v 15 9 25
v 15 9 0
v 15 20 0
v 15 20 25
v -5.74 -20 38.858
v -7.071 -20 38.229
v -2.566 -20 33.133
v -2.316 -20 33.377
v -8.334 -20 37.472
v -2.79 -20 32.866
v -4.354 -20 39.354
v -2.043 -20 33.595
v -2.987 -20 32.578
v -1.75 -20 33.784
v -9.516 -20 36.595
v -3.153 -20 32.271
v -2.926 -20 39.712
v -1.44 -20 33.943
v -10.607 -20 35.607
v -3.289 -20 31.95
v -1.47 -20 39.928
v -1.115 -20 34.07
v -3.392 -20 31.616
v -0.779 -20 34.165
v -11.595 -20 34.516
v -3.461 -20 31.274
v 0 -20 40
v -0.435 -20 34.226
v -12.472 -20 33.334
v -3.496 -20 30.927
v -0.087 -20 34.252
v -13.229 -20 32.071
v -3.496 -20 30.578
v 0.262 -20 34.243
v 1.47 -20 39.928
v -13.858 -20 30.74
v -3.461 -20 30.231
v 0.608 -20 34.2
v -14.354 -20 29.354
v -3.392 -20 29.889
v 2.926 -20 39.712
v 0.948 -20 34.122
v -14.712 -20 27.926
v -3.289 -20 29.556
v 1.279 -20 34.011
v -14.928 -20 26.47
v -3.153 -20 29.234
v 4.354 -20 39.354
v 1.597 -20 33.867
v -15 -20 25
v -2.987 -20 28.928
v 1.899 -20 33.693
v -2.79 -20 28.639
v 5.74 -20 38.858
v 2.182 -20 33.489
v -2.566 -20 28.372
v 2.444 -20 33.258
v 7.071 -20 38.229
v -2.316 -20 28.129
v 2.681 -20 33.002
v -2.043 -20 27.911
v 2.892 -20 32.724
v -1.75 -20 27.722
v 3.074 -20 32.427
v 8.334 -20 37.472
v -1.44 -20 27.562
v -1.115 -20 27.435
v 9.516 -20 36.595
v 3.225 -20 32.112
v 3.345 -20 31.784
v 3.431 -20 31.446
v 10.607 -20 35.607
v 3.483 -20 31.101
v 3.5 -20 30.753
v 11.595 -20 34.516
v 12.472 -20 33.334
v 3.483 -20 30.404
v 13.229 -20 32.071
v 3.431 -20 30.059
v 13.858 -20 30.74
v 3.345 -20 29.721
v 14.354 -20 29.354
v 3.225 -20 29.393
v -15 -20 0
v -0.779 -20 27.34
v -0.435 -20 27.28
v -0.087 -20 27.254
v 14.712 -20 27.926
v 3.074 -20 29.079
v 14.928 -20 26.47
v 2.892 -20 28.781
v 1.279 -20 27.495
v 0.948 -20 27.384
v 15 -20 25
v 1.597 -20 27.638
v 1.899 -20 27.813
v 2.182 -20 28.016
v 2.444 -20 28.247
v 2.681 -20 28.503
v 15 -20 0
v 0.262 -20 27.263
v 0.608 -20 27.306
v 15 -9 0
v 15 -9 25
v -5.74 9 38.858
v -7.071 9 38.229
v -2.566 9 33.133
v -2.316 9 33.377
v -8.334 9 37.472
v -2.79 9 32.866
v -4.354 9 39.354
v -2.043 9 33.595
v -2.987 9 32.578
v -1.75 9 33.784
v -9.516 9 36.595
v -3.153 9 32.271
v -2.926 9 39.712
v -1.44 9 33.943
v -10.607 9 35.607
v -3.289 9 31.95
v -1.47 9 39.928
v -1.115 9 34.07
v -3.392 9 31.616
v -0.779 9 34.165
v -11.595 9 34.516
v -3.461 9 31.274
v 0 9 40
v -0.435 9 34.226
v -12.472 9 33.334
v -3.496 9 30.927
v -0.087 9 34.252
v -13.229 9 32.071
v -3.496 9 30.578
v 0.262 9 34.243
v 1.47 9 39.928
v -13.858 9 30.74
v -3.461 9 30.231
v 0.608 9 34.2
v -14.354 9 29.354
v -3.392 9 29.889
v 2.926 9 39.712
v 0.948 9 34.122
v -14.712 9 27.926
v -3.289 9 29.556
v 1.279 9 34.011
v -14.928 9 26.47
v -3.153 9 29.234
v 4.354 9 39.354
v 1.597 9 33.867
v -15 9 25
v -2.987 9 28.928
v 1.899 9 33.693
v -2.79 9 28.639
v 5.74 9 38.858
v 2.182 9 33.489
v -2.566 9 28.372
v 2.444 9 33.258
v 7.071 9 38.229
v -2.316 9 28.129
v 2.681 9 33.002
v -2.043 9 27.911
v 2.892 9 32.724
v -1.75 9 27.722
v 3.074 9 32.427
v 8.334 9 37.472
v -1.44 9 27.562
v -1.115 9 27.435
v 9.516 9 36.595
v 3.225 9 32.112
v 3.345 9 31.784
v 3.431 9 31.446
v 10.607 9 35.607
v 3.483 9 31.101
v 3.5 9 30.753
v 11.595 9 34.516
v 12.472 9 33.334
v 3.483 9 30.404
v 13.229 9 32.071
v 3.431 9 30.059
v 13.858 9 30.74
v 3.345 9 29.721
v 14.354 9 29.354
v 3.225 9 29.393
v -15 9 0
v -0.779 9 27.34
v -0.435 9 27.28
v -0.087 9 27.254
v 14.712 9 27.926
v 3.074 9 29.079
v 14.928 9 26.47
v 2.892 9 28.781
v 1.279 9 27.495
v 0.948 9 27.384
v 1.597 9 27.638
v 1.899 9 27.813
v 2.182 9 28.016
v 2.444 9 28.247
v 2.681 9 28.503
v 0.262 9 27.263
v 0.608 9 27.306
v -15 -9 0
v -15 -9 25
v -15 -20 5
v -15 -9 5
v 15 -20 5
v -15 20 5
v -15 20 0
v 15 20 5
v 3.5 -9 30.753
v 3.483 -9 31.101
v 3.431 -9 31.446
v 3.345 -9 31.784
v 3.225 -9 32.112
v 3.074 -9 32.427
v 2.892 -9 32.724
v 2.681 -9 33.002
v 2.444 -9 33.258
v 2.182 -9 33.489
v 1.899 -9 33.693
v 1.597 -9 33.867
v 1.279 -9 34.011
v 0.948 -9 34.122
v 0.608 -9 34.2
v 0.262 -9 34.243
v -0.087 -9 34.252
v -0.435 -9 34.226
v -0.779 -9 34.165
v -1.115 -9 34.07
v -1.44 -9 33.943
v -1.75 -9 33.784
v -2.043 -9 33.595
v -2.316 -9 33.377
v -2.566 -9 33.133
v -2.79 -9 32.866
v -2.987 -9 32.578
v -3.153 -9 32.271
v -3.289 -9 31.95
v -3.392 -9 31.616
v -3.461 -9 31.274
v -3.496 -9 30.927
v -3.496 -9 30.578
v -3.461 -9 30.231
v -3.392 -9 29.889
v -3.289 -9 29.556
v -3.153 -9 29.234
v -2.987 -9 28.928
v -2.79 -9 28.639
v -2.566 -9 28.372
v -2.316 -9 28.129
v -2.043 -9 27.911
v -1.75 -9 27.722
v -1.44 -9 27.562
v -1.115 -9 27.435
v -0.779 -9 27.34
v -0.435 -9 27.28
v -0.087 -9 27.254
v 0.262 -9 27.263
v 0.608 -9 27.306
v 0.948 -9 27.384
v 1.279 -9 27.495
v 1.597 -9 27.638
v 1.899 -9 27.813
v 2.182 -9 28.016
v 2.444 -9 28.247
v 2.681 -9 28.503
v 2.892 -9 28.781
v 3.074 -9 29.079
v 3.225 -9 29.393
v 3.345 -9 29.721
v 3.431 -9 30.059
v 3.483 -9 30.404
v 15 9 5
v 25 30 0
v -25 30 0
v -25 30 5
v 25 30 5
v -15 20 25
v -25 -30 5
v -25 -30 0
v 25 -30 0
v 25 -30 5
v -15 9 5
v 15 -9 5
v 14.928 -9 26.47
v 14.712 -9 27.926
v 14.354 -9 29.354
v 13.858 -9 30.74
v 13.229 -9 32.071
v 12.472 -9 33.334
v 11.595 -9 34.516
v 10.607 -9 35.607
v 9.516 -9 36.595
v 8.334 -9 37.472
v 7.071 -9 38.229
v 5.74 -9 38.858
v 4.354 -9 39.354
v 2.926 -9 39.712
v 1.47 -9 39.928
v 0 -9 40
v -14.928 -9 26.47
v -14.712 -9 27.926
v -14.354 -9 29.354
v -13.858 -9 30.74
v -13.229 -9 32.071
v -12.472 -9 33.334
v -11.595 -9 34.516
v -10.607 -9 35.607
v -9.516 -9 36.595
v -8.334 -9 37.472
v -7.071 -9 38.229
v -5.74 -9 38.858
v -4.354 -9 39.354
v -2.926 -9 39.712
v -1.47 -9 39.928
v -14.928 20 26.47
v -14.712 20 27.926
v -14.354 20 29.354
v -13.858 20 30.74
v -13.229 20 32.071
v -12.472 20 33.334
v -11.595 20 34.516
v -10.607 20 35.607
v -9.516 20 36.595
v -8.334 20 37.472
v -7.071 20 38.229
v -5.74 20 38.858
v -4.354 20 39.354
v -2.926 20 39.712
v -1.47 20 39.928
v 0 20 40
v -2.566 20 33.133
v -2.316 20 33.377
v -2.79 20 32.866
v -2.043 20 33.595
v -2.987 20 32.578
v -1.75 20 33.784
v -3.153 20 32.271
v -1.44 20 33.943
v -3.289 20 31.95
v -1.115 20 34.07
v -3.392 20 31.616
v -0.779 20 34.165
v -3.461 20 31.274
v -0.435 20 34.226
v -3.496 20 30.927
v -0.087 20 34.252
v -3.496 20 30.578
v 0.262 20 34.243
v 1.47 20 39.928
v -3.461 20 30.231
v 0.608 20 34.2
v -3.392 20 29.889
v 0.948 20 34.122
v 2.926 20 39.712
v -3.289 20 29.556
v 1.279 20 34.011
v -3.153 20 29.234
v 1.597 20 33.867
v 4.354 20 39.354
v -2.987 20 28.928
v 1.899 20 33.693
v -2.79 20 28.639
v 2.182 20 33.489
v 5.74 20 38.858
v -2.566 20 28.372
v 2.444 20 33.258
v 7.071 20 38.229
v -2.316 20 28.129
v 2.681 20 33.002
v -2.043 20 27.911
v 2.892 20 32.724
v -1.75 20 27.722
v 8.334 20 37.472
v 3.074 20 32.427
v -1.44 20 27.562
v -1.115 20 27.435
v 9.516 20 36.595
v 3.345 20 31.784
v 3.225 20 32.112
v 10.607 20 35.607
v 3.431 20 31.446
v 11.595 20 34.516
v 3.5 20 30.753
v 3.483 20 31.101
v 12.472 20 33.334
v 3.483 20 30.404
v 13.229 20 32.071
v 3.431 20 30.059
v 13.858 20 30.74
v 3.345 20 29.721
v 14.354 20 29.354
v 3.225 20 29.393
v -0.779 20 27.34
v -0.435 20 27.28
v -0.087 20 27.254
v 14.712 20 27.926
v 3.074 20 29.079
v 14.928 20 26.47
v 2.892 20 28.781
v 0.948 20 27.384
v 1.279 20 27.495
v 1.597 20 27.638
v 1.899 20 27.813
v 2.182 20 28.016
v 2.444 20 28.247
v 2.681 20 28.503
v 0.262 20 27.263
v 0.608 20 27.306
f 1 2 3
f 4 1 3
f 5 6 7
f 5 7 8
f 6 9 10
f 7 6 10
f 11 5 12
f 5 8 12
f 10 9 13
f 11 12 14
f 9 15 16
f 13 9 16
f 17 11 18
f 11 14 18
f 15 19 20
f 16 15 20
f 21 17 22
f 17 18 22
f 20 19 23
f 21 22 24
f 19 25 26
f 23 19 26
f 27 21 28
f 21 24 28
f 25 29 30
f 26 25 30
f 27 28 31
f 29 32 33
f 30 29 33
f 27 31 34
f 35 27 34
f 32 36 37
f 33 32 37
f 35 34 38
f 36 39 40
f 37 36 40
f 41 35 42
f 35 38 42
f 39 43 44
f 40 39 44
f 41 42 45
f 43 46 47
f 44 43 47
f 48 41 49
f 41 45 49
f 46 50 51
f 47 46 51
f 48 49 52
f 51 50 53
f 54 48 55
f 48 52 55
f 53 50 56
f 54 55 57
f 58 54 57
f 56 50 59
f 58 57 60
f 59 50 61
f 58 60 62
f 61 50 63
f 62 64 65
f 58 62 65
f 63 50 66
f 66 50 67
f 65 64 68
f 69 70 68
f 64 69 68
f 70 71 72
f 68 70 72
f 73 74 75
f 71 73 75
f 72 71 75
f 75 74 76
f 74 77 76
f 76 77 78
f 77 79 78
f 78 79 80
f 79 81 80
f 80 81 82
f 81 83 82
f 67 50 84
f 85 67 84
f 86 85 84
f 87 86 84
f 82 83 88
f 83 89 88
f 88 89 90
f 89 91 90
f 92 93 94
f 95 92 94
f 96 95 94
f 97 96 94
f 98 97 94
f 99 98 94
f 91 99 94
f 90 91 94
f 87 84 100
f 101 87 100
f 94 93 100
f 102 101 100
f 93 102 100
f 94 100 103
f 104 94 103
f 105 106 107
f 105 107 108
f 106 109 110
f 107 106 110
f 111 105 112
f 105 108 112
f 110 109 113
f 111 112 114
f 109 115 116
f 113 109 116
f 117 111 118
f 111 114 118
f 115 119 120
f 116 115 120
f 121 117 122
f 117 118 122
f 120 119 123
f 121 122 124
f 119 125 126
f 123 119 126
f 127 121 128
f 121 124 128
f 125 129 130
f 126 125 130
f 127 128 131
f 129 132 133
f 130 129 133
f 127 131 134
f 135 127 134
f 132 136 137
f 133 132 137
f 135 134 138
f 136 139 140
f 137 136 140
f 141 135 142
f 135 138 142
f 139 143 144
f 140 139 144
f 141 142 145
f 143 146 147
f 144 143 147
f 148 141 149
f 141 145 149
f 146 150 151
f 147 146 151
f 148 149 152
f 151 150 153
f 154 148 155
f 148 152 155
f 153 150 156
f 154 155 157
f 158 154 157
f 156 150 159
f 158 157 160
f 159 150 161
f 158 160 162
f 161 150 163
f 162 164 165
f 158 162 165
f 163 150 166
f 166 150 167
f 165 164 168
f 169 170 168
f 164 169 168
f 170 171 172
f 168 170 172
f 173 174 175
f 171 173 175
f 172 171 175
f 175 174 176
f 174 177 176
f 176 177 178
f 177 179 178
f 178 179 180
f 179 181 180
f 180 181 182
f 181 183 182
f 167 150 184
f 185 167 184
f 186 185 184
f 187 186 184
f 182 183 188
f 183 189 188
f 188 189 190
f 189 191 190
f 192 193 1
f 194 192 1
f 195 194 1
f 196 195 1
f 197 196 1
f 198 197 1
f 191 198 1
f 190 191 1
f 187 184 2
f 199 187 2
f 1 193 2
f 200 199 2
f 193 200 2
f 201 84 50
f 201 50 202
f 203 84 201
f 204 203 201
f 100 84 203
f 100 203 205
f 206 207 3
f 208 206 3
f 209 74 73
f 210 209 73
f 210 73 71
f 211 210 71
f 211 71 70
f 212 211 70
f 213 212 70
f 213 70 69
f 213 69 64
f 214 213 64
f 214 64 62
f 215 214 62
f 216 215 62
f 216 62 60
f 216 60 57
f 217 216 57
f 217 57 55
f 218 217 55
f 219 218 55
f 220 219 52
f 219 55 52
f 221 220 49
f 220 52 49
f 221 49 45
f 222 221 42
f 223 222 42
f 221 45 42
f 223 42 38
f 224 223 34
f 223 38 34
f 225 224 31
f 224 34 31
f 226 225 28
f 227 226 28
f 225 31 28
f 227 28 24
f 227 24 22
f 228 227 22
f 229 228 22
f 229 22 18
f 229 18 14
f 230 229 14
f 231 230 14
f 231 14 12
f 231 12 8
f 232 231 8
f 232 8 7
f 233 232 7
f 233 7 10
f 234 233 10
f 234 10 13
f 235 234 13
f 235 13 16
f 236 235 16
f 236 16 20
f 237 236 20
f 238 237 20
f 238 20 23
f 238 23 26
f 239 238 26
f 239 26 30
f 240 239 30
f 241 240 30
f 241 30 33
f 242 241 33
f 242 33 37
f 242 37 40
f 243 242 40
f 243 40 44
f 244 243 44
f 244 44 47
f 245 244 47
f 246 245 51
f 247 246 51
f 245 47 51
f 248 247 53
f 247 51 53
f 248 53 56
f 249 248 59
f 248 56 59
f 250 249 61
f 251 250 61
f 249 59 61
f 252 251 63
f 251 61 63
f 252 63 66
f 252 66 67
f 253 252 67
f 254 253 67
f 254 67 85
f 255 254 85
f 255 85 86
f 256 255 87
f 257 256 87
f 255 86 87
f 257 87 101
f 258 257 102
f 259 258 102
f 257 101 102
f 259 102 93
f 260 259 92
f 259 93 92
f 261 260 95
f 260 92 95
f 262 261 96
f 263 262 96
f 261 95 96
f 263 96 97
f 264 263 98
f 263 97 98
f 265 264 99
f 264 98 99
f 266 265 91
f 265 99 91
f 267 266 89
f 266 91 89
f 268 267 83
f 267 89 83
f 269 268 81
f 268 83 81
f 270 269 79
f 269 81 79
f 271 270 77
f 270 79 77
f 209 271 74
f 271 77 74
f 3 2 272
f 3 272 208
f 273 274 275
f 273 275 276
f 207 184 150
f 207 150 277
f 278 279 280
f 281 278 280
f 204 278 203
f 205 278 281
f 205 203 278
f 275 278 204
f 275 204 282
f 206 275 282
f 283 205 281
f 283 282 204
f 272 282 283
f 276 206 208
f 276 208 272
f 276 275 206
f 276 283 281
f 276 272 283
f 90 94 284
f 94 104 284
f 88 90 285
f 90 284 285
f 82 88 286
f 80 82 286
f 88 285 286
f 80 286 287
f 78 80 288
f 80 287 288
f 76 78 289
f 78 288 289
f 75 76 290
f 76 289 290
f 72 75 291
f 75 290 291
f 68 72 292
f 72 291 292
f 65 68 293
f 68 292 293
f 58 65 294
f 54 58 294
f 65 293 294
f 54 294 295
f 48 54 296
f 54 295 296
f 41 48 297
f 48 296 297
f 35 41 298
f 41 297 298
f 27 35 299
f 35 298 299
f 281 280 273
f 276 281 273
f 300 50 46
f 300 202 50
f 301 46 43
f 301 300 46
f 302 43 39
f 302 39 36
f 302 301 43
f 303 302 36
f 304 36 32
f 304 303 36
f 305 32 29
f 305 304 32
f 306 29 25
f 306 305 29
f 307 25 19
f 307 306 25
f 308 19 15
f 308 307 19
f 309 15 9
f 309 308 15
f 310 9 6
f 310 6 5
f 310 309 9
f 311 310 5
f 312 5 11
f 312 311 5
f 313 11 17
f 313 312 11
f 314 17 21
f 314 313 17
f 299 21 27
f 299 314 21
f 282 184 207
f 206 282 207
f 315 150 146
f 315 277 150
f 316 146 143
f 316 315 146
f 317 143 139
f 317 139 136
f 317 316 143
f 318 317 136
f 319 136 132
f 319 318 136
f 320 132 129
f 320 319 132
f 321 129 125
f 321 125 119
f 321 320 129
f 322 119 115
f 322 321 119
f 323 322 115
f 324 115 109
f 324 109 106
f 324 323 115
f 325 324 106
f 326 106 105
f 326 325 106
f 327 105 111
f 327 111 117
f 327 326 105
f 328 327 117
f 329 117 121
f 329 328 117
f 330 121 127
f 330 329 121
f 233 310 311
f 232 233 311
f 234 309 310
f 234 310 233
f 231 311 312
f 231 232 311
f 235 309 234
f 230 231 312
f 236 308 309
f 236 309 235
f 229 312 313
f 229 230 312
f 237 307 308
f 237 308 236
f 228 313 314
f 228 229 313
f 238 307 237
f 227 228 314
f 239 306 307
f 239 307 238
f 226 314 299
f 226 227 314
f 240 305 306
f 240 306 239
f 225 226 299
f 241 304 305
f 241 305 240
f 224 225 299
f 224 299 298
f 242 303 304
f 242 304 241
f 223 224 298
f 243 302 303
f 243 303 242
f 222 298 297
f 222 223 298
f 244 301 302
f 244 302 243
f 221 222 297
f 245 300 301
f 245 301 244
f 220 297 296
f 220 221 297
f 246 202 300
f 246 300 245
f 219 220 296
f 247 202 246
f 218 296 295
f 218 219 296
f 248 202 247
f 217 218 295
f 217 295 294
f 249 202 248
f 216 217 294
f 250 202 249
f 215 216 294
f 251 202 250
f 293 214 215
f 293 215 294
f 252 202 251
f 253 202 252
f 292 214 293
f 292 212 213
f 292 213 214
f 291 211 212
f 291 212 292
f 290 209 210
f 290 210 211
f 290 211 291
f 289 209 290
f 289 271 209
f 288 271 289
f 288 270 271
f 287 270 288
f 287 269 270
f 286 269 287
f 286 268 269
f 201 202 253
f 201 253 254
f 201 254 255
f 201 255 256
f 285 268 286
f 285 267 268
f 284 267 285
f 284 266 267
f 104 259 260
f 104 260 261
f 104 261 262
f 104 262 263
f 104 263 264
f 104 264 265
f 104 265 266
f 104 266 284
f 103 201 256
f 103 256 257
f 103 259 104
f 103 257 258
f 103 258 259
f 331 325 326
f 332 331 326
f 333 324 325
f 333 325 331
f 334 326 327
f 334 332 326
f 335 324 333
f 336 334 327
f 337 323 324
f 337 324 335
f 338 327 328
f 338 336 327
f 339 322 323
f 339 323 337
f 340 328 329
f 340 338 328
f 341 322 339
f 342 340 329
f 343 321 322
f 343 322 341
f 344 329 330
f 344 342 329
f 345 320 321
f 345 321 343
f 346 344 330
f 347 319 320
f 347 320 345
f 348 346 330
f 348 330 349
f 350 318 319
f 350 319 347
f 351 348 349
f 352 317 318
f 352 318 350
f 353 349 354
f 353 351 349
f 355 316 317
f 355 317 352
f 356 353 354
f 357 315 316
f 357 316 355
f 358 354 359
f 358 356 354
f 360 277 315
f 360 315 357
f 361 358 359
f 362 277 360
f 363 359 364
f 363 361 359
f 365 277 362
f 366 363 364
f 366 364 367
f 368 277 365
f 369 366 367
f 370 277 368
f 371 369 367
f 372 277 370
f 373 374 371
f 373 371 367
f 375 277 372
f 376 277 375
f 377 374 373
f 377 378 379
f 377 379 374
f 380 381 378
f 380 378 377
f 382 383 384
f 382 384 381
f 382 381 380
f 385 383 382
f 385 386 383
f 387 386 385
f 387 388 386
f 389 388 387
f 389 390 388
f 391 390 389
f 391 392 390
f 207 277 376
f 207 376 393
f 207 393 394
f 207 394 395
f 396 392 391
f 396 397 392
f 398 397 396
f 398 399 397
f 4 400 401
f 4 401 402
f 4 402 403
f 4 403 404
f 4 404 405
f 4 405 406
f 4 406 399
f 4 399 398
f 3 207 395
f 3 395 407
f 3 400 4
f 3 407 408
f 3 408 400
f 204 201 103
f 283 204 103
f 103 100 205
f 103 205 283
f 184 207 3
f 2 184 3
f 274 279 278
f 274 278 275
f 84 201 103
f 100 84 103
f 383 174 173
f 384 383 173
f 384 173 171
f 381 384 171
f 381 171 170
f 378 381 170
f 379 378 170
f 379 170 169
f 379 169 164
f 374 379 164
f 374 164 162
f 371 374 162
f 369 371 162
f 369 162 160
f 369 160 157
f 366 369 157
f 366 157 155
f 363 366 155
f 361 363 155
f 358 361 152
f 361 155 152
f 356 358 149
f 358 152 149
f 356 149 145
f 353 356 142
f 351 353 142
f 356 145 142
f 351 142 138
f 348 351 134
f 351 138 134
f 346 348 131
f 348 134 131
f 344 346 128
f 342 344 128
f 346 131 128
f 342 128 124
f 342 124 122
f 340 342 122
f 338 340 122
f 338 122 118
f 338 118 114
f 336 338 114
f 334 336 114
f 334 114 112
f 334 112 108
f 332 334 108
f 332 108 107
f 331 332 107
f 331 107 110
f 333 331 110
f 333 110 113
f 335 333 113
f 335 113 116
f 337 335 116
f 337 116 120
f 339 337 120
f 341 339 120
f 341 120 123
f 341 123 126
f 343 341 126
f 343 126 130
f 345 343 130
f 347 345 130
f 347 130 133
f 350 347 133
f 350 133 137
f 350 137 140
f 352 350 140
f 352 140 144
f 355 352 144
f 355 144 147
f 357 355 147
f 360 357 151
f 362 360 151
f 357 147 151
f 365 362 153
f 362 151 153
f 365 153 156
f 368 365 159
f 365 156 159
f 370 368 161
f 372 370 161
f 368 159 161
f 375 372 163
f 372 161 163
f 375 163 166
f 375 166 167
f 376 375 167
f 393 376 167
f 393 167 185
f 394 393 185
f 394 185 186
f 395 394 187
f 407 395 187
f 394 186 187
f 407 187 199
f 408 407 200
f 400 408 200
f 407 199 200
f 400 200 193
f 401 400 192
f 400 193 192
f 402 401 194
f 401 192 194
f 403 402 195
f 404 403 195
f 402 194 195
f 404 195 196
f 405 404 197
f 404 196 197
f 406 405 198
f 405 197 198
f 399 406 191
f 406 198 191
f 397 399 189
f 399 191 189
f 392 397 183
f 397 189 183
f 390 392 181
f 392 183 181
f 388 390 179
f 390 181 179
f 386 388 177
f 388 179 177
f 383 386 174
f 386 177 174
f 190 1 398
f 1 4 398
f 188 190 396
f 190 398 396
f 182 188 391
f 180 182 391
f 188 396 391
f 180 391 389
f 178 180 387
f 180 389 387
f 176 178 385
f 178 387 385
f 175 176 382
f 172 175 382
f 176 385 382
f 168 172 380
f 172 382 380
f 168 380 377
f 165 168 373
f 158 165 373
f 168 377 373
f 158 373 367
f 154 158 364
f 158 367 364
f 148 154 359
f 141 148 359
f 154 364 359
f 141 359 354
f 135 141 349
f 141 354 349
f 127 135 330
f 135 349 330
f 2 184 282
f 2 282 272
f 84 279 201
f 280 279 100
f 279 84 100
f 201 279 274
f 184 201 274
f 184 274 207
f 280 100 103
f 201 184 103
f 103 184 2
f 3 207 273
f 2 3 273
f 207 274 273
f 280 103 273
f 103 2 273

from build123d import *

# Parameters (mm, degrees)
F0_W     = 30
F0_H     = 11
F1_DEPTH = 40
F0_W_2   = 50
F0_H_2   = 60
F2_DEPTH = 5
F3_R     = 14.99999
F3_2_R   = 14.99999
F5_D     = 7
F5_2_D   = 7


# Not quite as in the source:
# - a fillet or chamfer is up to 0.001 mm smaller than in the source, because OpenCascade refuses the exact size


with BuildPart() as f1:
    # F0 (on Top) → F1 (new body)
    with BuildSketch(Plane.XY):
        with Locations((0, 14.5)):
            Rectangle(F0_W, F0_H)
    extrude(amount=F1_DEPTH)

    # F3#2 (radius 15 in the source; OpenCascade refuses exactly that, so slightly less here)
    f3_2_edges = [f1.edges().sort_by_distance(p)[0] for p in [
        (15, 14.5, 40),
        (-15, 14.5, 40),
    ]]
    fillet(f3_2_edges, radius=F3_2_R)

    # F5 (through all)
    with Locations(Plane(origin=(0, 20, 0), x_dir=(-1, 0, 0), z_dir=(0, 1, 0))):
        with Locations((0, 30.7527389377)):
            Hole(F5_D / 2)


with BuildPart() as f1b:
    # F0 (on Top) → F1, piece 2 (new body)
    with BuildSketch(Plane.XY):
        with Locations((0, -14.5)):
            Rectangle(F0_W, F0_H)
    extrude(amount=F1_DEPTH)

    # F3 (radius 15 in the source; OpenCascade refuses exactly that, so slightly less here)
    f3_edges = [f1b.edges().sort_by_distance(p)[0] for p in [
        (15, -14.5, 40),
        (-15, -14.5, 40),
    ]]
    fillet(f3_edges, radius=F3_R)

    # F5#2 (through all)
    with Locations(Plane(origin=(0, 20, 0), x_dir=(-1, 0, 0), z_dir=(0, 1, 0))):
        with Locations((0, 30.7527389377)):
            Hole(F5_2_D / 2)


with BuildPart() as f2:
    # F0 (on Top) → F2 (new body)
    with BuildSketch(Plane.XY):
        Rectangle(F0_W_2, F0_H_2)
        with Locations((0, -14.5)):
            Rectangle(F0_W, F0_H, mode=Mode.SUBTRACT)
        with Locations((0, 14.5)):
            Rectangle(F0_W, F0_H, mode=Mode.SUBTRACT)
    extrude(amount=F2_DEPTH)


solid = Compound([f1.part, f1b.part, f2.part])
